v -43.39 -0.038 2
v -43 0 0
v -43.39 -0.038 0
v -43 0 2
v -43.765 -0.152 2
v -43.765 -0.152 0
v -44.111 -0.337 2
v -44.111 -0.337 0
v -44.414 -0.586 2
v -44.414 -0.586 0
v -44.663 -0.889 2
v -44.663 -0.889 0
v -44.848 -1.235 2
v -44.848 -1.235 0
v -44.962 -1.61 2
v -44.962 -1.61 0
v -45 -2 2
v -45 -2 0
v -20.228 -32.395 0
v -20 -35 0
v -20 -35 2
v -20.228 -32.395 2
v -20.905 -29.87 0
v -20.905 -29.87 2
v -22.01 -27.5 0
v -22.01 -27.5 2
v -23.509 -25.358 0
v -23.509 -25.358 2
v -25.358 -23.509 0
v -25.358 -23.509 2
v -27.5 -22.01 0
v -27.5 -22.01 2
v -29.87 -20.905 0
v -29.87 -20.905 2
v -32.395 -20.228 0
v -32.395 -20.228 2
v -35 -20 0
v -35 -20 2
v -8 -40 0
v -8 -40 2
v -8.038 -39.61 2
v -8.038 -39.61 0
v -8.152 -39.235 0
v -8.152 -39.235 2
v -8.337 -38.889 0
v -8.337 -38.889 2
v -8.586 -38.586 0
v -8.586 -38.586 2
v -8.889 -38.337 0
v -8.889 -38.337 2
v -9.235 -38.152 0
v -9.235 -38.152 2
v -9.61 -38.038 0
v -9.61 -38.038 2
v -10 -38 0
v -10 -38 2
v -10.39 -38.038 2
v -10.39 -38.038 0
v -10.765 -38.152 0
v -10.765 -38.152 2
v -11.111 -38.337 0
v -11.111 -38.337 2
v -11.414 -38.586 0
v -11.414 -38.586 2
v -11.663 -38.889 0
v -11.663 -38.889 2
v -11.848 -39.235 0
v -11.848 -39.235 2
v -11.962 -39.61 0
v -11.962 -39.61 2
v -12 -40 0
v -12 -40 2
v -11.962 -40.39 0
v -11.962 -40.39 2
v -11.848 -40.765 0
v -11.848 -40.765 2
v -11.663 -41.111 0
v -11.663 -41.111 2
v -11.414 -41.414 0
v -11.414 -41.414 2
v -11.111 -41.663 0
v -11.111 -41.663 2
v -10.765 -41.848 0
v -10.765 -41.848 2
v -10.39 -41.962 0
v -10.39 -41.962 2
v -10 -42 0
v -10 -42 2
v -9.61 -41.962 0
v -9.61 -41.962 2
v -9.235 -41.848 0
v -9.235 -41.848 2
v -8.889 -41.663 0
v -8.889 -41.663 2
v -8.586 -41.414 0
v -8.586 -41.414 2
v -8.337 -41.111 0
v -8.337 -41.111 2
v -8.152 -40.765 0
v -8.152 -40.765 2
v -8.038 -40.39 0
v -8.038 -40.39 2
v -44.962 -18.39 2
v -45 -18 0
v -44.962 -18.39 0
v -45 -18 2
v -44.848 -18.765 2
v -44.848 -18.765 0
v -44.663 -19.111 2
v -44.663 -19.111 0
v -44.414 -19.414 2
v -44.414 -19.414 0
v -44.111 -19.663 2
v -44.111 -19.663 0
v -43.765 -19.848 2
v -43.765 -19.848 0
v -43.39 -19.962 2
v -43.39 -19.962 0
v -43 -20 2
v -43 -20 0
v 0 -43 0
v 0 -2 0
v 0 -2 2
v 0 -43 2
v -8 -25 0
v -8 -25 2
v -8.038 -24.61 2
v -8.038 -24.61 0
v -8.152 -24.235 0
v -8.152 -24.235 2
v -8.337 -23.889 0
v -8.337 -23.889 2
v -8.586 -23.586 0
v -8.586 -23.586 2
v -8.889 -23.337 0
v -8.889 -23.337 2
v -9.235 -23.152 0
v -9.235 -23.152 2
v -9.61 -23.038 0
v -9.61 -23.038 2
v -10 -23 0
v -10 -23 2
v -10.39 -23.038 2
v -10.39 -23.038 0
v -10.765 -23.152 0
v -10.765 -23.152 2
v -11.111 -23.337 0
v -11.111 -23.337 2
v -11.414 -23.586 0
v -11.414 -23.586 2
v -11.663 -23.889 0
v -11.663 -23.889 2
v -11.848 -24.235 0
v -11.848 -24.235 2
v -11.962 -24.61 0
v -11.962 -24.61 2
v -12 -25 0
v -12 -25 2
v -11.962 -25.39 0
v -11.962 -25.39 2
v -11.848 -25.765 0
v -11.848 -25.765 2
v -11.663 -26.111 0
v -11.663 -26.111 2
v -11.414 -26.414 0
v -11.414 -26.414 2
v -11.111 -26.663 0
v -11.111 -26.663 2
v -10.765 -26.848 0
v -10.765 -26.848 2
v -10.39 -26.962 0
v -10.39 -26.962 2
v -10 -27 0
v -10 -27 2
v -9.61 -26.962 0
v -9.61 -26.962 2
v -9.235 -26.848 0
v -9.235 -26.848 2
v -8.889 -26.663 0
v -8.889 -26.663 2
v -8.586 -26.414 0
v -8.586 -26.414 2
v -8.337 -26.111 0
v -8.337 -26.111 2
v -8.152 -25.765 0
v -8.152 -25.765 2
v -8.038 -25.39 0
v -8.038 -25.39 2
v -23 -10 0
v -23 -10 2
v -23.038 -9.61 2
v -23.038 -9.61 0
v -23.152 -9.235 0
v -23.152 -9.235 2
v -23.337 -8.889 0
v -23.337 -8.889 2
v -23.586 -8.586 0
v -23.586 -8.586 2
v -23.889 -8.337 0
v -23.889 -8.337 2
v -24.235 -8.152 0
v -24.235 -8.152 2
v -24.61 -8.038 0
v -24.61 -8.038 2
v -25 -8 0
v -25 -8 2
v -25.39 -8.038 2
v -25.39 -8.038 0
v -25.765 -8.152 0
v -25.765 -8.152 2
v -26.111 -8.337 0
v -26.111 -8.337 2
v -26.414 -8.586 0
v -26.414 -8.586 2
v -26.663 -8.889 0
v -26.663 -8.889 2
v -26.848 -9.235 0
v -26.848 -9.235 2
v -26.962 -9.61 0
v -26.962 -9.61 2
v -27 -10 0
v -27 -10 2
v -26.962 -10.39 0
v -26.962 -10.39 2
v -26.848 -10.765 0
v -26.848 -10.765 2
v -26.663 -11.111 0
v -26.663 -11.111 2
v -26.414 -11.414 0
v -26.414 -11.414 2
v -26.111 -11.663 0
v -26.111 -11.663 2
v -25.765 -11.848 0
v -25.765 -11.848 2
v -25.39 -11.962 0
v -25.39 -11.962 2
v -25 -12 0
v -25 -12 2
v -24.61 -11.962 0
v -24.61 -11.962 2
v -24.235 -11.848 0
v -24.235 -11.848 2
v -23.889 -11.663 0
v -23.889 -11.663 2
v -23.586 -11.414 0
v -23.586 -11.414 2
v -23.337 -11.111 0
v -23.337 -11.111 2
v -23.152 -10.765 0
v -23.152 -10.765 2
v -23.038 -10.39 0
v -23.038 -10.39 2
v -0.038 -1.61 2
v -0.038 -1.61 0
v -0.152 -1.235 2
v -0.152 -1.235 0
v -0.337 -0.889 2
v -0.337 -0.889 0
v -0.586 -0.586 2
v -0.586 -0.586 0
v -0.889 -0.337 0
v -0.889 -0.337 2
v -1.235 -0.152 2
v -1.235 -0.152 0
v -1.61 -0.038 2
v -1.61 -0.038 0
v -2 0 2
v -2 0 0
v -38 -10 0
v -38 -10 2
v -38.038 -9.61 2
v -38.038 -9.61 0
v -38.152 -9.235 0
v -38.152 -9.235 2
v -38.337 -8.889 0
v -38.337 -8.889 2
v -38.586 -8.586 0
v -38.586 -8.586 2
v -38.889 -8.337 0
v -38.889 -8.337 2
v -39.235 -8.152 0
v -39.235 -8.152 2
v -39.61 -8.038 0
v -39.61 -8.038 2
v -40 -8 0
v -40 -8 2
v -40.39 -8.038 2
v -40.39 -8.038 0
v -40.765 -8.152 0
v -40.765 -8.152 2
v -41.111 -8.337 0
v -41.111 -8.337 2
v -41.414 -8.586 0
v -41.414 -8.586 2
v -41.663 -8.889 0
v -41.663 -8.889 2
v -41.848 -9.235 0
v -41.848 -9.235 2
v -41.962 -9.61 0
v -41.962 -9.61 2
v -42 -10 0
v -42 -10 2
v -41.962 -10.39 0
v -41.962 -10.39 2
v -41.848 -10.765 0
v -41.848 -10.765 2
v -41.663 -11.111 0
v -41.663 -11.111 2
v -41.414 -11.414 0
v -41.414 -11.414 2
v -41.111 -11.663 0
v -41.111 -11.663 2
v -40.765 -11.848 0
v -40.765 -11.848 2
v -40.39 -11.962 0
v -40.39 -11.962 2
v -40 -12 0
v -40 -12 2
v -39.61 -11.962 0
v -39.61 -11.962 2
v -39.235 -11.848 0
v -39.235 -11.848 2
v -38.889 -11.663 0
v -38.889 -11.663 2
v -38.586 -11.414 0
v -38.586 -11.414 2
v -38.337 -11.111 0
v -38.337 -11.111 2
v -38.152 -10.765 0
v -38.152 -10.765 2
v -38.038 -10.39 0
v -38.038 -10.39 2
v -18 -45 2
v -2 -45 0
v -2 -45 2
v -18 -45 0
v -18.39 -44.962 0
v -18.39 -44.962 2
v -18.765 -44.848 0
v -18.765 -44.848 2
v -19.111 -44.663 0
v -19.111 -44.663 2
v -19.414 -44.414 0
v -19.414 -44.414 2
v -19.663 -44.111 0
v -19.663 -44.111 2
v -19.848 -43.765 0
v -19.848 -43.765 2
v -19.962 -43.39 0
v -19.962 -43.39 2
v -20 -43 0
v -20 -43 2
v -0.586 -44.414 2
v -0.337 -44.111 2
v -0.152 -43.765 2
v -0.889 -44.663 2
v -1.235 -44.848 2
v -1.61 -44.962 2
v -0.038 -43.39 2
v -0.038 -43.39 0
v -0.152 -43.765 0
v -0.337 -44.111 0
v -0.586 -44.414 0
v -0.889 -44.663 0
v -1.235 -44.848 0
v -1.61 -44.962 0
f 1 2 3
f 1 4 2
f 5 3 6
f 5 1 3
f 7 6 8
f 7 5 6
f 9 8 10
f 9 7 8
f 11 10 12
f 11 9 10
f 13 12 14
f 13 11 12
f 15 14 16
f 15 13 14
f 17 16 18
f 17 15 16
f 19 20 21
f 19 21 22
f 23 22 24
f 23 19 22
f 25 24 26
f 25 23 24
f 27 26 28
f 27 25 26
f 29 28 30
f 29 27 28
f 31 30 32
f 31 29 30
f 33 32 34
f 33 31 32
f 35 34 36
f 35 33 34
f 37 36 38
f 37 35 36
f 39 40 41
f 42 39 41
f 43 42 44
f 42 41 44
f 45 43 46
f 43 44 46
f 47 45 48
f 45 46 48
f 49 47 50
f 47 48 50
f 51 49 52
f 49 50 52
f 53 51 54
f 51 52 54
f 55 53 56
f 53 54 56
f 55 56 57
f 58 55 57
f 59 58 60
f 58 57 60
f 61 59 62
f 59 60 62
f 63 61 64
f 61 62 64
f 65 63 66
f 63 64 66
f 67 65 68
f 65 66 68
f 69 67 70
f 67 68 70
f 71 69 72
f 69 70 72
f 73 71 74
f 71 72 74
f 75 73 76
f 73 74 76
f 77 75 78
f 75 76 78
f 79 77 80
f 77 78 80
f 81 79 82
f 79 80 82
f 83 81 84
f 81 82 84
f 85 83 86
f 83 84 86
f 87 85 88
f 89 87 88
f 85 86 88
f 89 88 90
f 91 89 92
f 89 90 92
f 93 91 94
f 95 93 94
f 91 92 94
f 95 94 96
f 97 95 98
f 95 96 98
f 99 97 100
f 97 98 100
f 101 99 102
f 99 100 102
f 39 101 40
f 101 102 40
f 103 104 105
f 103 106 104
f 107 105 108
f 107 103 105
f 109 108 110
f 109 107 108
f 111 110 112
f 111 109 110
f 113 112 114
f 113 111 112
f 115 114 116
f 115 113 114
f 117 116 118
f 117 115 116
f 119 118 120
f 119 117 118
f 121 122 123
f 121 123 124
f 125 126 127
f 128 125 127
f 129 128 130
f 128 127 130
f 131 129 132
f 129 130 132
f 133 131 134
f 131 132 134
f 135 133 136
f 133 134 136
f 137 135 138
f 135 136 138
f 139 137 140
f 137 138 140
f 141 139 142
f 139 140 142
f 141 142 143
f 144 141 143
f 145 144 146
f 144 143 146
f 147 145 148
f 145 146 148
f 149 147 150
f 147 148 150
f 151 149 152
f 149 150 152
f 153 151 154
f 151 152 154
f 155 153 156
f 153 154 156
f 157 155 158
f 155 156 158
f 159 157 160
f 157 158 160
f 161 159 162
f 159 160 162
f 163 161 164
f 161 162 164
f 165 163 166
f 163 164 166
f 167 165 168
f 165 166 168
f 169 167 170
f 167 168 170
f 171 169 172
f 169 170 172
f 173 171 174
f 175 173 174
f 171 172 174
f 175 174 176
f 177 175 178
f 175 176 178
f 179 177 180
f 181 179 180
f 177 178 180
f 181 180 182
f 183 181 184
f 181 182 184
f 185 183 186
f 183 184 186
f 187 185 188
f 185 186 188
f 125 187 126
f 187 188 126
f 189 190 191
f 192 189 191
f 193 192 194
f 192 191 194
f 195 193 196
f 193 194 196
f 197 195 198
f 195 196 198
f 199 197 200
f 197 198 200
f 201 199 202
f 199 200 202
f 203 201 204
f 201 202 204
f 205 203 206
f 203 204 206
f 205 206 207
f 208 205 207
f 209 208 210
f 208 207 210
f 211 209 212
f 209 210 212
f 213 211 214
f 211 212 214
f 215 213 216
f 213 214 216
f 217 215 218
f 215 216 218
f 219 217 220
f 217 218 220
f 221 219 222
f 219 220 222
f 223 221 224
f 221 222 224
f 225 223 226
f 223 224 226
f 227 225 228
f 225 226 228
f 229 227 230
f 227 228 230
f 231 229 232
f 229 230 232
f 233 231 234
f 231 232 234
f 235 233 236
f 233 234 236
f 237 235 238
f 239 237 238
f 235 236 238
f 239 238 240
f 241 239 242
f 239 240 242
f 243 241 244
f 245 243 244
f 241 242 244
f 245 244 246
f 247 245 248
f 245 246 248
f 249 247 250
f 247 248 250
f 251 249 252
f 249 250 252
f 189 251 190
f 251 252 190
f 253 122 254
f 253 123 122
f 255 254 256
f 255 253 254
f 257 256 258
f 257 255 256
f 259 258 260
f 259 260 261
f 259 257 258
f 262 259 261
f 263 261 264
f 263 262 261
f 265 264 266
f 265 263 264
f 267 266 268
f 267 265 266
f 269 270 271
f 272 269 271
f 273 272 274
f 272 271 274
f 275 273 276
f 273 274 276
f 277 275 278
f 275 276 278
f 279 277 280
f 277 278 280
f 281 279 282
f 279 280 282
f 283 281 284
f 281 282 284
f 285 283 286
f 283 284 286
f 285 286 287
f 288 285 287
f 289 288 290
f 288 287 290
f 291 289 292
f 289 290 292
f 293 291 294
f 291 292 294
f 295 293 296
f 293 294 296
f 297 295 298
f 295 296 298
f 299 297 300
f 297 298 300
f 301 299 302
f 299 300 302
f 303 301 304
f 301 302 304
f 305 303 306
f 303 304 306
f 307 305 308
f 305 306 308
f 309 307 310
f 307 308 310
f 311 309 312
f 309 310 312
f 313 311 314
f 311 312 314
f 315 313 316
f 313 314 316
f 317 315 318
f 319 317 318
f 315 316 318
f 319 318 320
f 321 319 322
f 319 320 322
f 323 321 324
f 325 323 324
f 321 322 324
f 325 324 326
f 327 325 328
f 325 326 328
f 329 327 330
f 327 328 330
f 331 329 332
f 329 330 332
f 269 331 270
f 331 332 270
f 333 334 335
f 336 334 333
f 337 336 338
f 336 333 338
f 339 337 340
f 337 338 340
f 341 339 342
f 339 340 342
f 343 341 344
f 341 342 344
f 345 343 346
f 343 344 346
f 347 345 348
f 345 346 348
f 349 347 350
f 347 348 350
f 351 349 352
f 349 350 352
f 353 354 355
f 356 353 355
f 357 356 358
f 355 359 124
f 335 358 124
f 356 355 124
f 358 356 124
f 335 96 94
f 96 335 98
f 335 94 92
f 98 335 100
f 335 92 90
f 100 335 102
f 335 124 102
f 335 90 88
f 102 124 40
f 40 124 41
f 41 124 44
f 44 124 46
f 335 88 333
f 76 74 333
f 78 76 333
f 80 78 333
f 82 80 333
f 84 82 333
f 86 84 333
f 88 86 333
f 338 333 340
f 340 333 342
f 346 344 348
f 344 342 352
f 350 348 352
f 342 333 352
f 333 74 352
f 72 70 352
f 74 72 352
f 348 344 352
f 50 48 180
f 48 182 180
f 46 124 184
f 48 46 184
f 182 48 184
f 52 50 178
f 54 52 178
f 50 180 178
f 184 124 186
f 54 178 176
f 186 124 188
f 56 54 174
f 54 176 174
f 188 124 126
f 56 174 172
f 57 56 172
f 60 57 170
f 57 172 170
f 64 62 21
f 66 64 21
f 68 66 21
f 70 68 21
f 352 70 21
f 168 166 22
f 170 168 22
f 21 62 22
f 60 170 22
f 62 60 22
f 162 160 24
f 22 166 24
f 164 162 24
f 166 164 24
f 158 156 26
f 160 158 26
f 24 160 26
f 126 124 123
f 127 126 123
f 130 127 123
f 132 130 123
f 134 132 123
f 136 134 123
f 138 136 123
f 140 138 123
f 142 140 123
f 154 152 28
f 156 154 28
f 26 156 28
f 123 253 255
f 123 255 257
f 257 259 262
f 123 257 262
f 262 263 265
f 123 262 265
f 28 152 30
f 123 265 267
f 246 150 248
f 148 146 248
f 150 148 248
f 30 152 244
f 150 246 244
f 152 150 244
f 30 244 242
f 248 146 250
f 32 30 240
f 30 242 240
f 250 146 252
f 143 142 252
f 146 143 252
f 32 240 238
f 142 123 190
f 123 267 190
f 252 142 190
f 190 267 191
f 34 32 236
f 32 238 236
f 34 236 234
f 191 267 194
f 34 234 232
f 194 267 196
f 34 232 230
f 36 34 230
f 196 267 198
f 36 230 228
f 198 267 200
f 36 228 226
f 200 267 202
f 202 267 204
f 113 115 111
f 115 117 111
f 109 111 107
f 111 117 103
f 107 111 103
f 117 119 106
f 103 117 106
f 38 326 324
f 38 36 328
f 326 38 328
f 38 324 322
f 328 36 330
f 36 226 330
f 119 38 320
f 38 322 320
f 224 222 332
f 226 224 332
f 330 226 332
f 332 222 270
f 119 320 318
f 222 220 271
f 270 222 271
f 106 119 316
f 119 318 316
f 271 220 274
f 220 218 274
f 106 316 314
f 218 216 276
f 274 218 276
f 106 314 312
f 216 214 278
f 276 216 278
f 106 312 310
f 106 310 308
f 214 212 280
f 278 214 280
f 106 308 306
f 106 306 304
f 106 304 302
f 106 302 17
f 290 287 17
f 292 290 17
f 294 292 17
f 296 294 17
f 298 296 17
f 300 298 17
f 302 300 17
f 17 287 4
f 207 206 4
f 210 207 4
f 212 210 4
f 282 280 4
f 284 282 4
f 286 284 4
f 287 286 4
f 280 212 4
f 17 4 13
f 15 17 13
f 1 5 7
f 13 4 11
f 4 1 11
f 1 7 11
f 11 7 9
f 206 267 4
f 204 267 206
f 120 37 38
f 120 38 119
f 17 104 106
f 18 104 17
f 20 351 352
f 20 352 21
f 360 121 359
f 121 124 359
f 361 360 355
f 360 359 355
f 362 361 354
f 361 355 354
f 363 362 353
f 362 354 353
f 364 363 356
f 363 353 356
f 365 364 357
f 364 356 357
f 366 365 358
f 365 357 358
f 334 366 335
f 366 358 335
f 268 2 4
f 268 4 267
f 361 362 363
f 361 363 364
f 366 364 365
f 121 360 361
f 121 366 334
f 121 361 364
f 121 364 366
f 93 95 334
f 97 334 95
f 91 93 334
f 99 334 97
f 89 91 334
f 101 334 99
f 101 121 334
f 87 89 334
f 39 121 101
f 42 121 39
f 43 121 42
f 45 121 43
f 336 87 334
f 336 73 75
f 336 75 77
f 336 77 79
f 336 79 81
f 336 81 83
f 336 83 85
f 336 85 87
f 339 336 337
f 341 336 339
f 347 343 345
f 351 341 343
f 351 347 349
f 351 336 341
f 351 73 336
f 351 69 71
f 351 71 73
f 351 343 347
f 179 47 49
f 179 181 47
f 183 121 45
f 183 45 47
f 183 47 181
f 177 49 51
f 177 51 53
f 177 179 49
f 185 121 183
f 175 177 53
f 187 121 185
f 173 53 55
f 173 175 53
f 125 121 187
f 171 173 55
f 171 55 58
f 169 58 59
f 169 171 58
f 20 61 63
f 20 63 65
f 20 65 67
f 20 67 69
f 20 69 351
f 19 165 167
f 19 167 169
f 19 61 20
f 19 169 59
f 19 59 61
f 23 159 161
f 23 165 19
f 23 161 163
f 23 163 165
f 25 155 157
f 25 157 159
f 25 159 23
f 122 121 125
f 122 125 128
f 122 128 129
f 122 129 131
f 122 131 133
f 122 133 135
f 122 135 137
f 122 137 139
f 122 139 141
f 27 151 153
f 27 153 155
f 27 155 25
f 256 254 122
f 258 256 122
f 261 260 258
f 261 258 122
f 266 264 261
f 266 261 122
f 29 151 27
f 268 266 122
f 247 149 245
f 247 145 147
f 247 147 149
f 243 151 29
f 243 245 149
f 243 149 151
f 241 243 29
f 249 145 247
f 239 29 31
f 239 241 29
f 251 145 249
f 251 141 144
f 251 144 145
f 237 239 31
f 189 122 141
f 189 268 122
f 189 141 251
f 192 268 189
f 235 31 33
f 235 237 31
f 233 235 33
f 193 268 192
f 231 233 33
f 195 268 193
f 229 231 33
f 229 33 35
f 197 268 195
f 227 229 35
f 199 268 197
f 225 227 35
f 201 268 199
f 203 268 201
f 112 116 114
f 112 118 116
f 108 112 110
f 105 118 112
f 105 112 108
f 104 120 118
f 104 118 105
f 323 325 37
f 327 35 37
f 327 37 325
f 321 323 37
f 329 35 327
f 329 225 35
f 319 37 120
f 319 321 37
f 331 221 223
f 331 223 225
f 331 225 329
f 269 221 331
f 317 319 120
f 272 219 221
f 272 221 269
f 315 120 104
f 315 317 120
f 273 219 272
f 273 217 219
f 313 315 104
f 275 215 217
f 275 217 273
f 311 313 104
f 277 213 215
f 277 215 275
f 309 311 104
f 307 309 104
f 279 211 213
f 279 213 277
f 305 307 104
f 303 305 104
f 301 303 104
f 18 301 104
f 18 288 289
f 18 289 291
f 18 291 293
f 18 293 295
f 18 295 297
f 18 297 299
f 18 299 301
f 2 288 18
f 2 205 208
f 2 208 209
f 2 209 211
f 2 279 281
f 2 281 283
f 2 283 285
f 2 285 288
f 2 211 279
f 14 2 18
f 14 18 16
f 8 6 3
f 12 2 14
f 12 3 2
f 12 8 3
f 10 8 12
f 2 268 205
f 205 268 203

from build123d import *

# Parameters (mm, degrees)
EXTRUDE_1_DEPTH     = 2
SKETCH_2_R          = 2
CUT_EXTRUDE_1_DEPTH = 2
FILLET_1_R          = 2


with BuildPart() as part:
    # 草图1 → 凸台-拉伸1 (new body)
    with BuildSketch(Plane.XY):
        with BuildLine():
            Line((0, 0), (0, -45))
            Line((0, -45), (-20, -45))
            Line((-20, -45), (-20, -35))
            ThreePointArc((-20, -35), (-24.393398282, -24.393398282), (-35, -20))
            Line((-35, -20), (-45, -20))
            Line((-45, -20), (-45, 0))
            Line((-45, 0), (0, 0))
        make_face()
    extrude(amount=EXTRUDE_1_DEPTH)

    # 草图2 → 切除-拉伸1 (cut)
    with BuildSketch(Plane.XY.offset(2)):
        with Locations((-10, -40)):
            Circle(SKETCH_2_R)
        with Locations((-10, -25)):
            Circle(SKETCH_2_R)
        with Locations((-25, -10)):
            Circle(SKETCH_2_R)
        with Locations((-40, -10)):
            Circle(SKETCH_2_R)
    extrude(amount=-CUT_EXTRUDE_1_DEPTH, mode=Mode.SUBTRACT)

    # 圆角1
    fillet_1_edges = [part.edges().sort_by_distance(p)[0] for p in [
        (0, 0, 1),
        (0, -45, 1),
        (-20, -45, 1),
        (-45, -20, 1),
        (-45, 0, 1),
    ]]
    fillet(fillet_1_edges, radius=FILLET_1_R)


solid = part.part
